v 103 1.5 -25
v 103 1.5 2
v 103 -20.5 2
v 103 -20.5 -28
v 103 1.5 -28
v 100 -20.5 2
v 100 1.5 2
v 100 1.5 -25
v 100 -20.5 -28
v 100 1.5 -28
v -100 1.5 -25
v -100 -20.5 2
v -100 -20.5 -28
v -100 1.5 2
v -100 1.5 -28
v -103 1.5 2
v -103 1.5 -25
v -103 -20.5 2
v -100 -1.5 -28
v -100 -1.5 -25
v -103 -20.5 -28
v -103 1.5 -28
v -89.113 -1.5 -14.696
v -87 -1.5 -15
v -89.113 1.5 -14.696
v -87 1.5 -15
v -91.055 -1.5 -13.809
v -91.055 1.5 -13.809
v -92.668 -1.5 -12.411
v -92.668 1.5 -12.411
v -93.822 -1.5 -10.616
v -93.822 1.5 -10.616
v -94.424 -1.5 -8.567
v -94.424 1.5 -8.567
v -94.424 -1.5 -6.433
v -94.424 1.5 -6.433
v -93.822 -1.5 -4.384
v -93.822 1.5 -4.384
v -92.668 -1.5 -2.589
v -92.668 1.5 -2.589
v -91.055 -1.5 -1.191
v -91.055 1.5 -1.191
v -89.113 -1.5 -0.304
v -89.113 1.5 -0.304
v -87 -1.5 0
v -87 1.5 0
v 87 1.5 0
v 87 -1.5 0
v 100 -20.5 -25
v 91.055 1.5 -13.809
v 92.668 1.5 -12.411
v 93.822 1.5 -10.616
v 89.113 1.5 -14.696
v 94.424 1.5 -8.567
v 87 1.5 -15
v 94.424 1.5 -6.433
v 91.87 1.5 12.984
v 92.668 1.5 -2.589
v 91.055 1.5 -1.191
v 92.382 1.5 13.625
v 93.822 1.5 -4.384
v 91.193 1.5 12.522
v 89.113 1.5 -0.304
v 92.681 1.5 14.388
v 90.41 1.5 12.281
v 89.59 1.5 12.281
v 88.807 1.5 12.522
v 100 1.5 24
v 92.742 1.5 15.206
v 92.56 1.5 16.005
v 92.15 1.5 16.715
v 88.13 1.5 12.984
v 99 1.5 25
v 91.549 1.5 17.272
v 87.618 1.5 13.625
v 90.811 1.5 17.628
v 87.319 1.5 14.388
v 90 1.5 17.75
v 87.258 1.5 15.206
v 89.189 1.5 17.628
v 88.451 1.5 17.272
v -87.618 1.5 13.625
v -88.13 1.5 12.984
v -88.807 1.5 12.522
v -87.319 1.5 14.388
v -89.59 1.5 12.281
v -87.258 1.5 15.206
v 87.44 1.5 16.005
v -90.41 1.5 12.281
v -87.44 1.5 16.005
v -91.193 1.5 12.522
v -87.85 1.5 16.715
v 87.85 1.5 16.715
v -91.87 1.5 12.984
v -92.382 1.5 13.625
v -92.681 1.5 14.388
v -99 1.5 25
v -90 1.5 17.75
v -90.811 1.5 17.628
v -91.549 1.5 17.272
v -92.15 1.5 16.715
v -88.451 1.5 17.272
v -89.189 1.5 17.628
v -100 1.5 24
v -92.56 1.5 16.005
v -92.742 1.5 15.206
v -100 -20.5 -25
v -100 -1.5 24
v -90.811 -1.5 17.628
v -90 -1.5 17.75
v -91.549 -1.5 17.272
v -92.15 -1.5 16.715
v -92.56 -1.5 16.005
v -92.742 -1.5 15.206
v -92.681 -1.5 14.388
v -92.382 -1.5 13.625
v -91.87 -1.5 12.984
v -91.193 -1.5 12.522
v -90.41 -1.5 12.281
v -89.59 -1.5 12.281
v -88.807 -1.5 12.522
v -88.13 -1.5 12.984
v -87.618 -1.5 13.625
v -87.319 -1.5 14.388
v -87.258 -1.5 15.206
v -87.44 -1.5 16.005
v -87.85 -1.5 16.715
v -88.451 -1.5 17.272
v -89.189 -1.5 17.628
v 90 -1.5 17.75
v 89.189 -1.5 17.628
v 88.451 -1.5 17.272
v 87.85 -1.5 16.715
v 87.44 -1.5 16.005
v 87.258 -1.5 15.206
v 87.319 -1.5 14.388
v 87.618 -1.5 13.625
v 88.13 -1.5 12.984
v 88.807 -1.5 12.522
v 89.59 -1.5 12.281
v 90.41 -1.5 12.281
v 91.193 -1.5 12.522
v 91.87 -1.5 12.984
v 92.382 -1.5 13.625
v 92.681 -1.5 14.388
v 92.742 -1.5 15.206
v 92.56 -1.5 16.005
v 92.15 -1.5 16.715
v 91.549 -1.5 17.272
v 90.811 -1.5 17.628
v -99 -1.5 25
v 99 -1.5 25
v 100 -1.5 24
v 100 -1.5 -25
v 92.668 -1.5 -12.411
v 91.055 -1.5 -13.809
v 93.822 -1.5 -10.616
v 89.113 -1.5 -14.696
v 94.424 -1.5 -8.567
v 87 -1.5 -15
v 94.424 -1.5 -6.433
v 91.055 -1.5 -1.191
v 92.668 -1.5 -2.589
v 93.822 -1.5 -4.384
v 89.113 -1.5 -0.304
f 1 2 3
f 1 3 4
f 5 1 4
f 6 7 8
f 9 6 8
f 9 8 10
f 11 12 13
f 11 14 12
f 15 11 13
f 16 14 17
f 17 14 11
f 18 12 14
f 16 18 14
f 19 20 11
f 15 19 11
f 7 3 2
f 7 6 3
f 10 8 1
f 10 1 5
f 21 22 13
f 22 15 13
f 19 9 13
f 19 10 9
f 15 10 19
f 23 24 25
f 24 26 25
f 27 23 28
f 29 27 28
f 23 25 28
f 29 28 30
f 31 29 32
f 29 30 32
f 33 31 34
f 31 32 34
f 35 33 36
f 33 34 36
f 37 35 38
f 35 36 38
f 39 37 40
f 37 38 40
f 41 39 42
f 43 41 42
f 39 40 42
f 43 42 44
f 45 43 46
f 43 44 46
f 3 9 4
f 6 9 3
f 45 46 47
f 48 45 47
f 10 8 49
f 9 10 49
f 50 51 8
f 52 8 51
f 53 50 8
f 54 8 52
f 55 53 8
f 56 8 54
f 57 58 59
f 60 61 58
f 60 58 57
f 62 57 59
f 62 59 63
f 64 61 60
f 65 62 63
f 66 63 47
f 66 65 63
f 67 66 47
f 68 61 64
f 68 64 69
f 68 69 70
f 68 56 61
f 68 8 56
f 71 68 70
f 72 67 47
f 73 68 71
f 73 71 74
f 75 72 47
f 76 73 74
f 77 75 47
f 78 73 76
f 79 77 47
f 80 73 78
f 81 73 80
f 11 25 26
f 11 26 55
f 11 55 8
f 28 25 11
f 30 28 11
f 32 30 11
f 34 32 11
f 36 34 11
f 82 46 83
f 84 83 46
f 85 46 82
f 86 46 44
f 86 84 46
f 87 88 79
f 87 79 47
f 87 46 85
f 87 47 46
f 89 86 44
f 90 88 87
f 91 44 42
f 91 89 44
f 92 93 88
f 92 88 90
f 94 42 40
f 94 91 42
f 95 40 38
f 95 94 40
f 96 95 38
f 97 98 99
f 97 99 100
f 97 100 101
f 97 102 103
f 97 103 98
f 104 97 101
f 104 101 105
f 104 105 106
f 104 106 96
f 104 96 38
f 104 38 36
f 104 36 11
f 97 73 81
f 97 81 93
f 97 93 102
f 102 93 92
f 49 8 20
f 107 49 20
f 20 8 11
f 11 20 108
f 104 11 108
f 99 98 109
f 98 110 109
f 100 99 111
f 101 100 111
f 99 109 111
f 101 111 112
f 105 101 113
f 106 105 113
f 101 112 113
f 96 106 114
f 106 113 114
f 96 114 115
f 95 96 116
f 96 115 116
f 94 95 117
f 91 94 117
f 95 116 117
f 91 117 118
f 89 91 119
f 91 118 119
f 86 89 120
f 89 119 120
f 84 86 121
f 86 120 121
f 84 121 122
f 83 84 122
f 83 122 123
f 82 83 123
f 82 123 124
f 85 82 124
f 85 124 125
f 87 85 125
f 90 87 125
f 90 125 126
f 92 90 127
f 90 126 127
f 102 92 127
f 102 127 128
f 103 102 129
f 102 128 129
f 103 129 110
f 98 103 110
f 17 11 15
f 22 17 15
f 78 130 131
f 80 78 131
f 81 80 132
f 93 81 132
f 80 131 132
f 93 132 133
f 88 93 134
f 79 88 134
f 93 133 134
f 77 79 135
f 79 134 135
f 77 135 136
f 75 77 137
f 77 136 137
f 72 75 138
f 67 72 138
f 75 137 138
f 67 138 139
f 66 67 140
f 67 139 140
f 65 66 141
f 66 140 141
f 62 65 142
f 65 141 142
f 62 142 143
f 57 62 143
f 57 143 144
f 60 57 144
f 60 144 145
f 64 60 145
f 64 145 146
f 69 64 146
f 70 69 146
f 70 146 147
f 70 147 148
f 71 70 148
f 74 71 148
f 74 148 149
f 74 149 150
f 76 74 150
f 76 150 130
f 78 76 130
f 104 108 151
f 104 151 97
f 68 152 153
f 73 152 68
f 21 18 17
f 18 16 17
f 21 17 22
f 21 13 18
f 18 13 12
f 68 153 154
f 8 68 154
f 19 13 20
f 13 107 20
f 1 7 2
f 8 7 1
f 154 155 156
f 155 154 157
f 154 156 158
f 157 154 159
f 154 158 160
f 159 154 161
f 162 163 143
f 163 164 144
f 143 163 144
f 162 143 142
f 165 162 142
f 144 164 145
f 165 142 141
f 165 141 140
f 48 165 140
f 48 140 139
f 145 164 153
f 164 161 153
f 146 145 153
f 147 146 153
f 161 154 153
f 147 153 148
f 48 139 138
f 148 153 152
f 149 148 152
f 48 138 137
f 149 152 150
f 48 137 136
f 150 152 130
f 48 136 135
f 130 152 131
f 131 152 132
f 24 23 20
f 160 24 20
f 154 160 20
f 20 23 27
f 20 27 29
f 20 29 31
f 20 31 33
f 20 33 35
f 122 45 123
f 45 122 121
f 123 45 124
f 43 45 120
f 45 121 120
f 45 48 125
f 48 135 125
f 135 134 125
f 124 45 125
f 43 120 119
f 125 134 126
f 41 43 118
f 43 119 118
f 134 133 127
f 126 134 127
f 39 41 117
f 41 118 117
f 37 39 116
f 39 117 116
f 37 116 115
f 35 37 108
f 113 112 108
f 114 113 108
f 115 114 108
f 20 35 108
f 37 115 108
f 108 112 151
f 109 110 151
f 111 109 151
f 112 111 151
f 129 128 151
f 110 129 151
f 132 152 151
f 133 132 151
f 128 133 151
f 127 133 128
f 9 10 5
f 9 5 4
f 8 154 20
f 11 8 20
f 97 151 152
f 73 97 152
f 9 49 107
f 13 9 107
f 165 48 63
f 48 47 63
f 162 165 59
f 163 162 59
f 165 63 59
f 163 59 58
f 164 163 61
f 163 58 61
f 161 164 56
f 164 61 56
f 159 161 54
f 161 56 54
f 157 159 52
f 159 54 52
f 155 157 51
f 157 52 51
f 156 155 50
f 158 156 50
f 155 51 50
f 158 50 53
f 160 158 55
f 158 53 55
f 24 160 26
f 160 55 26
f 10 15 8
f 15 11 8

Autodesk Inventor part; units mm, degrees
ref_plane "YZ Plane" through (0, 0, 0) normal (1, 0, 0) x (0, 1, 0)
ref_plane "XZ Plane" through (0, 0, 0) normal (0, 1, 0) x (-1, 0, 0)
ref_plane "XY Plane" through (0, 0, 0) normal (0, 0, 1) x (1, 0, 0)
sketch "Sketch2" plane through (0, 0, 0) normal (0, 1, 0) x (-1, 0, 0)
  line L0 (-100, -25) -> (100, -25)
  line L1 (100, -25) -> (100, 25)
  line L2 (100, 25) -> (-100, 25)
  line L3 (-100, 25) -> (-100, -25)
  line L4 (-100, -25) -> (100, 25) construction
  line L5 (100, -25) -> (-100, 25) construction
  point P0 (0, 0)
  dimension "d1" = 200
  dimension "d2" = 50
extrude "Extrusion1" add sketch "Sketch2" along normal mid plane 3
sketch "Sketch3" plane through (100, -1.5, -25) normal (1, 0, 0) x (0, 0, -1)
  line L0 (-27, 3) -> (3, 3)
  line L1 (3, 3) -> (3, -19)
  line L2 (3, -19) -> (-27, -19)
  line L3 (-27, -19) -> (-27, 3)
  line L4 (0, 0) -> (0, 3) projected
  line L5 (-50, 3) -> (0, 3) projected
  point P0 (-25, 1.5)
  dimension "d13" = 3
  dimension "d14" = 22
  dimension "d15" = 30
extrude "Extrusion2" add sketch "Sketch3" along normal blind 3 separate body
extrude "Extrusion3" add sketch "Sketch3" against normal blind 3 from surface at -200 separate body
sketch "Sketch5" plane through (100, 1.5, -25) normal (0, 0, -1) x (-1, 0, 0)
  line L0 (200, -3) -> (200, 0) projected
  line L1 (200, 0) -> (0, 0)
  line L2 (0, 0) -> (0, -22)
  line L3 (0, -22) -> (200, -22)
  line L4 (200, -22) -> (200, 0)
  line L5 (0, -22) -> (0, 0) projected
  line L6 (0, -22) -> (-3, -22) projected
  point P0 (100, -1.5)
extrude "Extrusion5" add sketch "Sketch5" along normal blind 3 separate body
sketch "Sketch6" plane through (0, 1.5, 0) normal (0, 1, 0) x (1, 0, 0)
  line L0 (87, 7.5) -> (-87, 7.5) construction
  line L1 (87, 15) -> (-87, 15)
  line L2 (-87, 0) -> (87, 0)
  arc A0 (87, 0) -> (87, 15) centre (87, 7.5) ccw
  arc A1 (-87, 15) -> (-87, 0) centre (-87, 7.5) ccw
  line L3 (-100, -25) -> (100, -25) projected
  line L4 (-100, 28) -> (-100, -2) projected
  line L5 (100, 28) -> (100, -2) projected
  point P0 (0, 0)
  point P1 (0, 7.5)
  dimension "d40" = 32.5
  dimension "d41" = 13
  dimension "d43" = 13
  dimension "d44" = 15
extrude "Extrusion6" cut sketch "Sketch6" along normal through all both and the other way through all bodies 1
sketch "Sketch7" plane through (0, 1.5, 0) normal (0, 1, 0) x (1, 0, 0)
  line L0 (-100, -25) -> (100, -25) projected
  line L1 (-100, 25) -> (-100, -25) projected
  line L2 (100, -25) -> (100, 25) projected
  point P0 (0, 0)
  point P1 (90, -15)
  point P2 (-90, -15)
  dimension "d34" = 10
  dimension "d35" = 10
  dimension "d36" = 10
hole "Hole1" at (90, 1.5, 15) at (-90, 1.5, 15) direction (0, -1, 0) diameter 5.5 end through all bodies 1 clearance for "Socket Head Cap Screw" size "M5" standard "TS Profile"
chamfer "Chamfer1" distance 1 angle 45 2 edges at (-100, 0, 25) (100, 0, 25)
equation "\"d36\" = d35"
properties part number "TL20240901-10320CV-027" material "PC"
